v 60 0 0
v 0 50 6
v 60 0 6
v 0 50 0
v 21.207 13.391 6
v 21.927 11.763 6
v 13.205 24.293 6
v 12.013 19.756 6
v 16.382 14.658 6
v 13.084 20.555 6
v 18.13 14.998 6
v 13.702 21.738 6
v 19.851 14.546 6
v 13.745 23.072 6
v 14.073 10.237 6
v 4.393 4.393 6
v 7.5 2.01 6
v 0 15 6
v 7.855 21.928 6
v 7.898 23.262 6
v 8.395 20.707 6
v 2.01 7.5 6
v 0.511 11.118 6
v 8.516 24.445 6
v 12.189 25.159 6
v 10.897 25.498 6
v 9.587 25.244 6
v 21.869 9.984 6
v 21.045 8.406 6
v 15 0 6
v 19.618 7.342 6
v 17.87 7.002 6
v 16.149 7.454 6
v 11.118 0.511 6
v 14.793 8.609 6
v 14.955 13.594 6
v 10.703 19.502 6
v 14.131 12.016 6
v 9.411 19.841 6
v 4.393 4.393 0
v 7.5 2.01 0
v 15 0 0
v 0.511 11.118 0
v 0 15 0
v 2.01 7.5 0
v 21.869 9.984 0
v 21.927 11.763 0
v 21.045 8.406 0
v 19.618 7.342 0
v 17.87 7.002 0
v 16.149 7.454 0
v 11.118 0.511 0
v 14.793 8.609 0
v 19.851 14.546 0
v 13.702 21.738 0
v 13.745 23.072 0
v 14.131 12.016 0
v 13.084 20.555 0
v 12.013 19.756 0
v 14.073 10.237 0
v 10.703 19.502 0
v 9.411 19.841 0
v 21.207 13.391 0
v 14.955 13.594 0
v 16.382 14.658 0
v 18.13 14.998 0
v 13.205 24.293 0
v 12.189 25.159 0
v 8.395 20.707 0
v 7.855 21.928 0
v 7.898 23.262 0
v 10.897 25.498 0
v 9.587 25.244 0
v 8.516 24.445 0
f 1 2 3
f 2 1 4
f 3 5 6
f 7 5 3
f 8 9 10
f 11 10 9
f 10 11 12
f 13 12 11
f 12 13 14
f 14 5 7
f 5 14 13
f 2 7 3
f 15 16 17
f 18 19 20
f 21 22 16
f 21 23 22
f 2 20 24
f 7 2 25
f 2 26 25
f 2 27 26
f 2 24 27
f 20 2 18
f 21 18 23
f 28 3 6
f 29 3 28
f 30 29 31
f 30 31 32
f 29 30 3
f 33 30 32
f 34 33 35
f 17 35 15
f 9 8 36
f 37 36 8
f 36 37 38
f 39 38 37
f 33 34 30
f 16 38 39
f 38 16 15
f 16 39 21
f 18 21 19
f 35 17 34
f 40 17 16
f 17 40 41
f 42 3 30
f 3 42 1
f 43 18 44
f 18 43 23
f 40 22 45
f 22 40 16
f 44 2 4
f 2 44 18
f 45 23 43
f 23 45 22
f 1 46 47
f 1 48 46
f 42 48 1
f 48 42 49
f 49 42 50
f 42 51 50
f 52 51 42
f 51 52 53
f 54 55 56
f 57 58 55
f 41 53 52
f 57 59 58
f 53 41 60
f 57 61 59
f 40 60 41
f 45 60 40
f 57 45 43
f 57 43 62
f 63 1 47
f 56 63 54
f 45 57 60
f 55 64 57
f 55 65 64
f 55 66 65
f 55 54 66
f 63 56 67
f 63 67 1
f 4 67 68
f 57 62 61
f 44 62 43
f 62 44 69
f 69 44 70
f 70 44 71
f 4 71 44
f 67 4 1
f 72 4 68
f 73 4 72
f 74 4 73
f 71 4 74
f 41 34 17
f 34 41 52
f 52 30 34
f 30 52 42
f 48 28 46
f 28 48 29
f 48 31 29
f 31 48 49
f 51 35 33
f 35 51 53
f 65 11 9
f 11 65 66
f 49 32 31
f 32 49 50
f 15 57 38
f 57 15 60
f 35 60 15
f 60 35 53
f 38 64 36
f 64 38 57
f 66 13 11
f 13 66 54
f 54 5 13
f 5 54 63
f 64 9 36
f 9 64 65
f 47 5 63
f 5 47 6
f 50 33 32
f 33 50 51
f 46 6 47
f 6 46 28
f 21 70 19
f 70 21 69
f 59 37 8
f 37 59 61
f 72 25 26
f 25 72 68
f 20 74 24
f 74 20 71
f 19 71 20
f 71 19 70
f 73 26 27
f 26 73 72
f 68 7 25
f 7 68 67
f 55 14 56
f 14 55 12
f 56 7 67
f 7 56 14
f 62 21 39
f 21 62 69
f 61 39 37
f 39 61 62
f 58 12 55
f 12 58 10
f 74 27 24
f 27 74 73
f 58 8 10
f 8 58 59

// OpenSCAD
$fn = 32;

// ----------------------------------------------------------------------
// Bracket plate: corner pad 60 x 50, fillet R15
// ----------------------------------------------------------------------

// --- parameters (mm) ---
hole_r = 3;               // bolt hole radius
plate_t = 6;              // plate thickness, Z (extrusion height)
leg_a = 60;               // base leg
leg_b = 50;               // height leg
fillet_r = 15;            // right-angle fillet radius

hole_d1 = 2 * hole_r + 2;
hole_d2 = 2 * hole_r;

profile = [[15, 0], [60, 0], [0, 50], [0, 15], [0.511, 11.118], [2.01, 7.5], [4.393, 4.393], [7.5, 2.01], [11.118, 0.511]];  // primary outline, 9 points, counter clockwise
void_1 = [[21.927, 11.763], [21.207, 13.391], [19.851, 14.546], [18.13, 14.998], [16.382, 14.658], [14.955, 13.594], [14.131, 12.016], [14.073, 10.237], [14.793, 8.609], [16.149, 7.454], [17.87, 7.002], [19.618, 7.342], [21.045, 8.406], [21.869, 9.984]];  // mount hole 1, 14 points
void_2 = [[13.745, 23.072], [13.205, 24.293], [12.189, 25.159], [10.897, 25.498], [9.587, 25.244], [8.516, 24.445], [7.898, 23.262], [7.855, 21.928], [8.395, 20.707], [9.411, 19.841], [10.703, 19.502], [12.013, 19.756], [13.084, 20.555], [13.702, 21.738]];  // mount hole 2, 14 points

// --- the one profile operation ---
difference() {
  linear_extrude(height = plate_t) polygon(points = profile);
  translate([0, 0, -1])
    linear_extrude(height = plate_t + 2) polygon(points = void_1);
  translate([0, 0, -1])
    linear_extrude(height = plate_t + 2) polygon(points = void_2);
}
